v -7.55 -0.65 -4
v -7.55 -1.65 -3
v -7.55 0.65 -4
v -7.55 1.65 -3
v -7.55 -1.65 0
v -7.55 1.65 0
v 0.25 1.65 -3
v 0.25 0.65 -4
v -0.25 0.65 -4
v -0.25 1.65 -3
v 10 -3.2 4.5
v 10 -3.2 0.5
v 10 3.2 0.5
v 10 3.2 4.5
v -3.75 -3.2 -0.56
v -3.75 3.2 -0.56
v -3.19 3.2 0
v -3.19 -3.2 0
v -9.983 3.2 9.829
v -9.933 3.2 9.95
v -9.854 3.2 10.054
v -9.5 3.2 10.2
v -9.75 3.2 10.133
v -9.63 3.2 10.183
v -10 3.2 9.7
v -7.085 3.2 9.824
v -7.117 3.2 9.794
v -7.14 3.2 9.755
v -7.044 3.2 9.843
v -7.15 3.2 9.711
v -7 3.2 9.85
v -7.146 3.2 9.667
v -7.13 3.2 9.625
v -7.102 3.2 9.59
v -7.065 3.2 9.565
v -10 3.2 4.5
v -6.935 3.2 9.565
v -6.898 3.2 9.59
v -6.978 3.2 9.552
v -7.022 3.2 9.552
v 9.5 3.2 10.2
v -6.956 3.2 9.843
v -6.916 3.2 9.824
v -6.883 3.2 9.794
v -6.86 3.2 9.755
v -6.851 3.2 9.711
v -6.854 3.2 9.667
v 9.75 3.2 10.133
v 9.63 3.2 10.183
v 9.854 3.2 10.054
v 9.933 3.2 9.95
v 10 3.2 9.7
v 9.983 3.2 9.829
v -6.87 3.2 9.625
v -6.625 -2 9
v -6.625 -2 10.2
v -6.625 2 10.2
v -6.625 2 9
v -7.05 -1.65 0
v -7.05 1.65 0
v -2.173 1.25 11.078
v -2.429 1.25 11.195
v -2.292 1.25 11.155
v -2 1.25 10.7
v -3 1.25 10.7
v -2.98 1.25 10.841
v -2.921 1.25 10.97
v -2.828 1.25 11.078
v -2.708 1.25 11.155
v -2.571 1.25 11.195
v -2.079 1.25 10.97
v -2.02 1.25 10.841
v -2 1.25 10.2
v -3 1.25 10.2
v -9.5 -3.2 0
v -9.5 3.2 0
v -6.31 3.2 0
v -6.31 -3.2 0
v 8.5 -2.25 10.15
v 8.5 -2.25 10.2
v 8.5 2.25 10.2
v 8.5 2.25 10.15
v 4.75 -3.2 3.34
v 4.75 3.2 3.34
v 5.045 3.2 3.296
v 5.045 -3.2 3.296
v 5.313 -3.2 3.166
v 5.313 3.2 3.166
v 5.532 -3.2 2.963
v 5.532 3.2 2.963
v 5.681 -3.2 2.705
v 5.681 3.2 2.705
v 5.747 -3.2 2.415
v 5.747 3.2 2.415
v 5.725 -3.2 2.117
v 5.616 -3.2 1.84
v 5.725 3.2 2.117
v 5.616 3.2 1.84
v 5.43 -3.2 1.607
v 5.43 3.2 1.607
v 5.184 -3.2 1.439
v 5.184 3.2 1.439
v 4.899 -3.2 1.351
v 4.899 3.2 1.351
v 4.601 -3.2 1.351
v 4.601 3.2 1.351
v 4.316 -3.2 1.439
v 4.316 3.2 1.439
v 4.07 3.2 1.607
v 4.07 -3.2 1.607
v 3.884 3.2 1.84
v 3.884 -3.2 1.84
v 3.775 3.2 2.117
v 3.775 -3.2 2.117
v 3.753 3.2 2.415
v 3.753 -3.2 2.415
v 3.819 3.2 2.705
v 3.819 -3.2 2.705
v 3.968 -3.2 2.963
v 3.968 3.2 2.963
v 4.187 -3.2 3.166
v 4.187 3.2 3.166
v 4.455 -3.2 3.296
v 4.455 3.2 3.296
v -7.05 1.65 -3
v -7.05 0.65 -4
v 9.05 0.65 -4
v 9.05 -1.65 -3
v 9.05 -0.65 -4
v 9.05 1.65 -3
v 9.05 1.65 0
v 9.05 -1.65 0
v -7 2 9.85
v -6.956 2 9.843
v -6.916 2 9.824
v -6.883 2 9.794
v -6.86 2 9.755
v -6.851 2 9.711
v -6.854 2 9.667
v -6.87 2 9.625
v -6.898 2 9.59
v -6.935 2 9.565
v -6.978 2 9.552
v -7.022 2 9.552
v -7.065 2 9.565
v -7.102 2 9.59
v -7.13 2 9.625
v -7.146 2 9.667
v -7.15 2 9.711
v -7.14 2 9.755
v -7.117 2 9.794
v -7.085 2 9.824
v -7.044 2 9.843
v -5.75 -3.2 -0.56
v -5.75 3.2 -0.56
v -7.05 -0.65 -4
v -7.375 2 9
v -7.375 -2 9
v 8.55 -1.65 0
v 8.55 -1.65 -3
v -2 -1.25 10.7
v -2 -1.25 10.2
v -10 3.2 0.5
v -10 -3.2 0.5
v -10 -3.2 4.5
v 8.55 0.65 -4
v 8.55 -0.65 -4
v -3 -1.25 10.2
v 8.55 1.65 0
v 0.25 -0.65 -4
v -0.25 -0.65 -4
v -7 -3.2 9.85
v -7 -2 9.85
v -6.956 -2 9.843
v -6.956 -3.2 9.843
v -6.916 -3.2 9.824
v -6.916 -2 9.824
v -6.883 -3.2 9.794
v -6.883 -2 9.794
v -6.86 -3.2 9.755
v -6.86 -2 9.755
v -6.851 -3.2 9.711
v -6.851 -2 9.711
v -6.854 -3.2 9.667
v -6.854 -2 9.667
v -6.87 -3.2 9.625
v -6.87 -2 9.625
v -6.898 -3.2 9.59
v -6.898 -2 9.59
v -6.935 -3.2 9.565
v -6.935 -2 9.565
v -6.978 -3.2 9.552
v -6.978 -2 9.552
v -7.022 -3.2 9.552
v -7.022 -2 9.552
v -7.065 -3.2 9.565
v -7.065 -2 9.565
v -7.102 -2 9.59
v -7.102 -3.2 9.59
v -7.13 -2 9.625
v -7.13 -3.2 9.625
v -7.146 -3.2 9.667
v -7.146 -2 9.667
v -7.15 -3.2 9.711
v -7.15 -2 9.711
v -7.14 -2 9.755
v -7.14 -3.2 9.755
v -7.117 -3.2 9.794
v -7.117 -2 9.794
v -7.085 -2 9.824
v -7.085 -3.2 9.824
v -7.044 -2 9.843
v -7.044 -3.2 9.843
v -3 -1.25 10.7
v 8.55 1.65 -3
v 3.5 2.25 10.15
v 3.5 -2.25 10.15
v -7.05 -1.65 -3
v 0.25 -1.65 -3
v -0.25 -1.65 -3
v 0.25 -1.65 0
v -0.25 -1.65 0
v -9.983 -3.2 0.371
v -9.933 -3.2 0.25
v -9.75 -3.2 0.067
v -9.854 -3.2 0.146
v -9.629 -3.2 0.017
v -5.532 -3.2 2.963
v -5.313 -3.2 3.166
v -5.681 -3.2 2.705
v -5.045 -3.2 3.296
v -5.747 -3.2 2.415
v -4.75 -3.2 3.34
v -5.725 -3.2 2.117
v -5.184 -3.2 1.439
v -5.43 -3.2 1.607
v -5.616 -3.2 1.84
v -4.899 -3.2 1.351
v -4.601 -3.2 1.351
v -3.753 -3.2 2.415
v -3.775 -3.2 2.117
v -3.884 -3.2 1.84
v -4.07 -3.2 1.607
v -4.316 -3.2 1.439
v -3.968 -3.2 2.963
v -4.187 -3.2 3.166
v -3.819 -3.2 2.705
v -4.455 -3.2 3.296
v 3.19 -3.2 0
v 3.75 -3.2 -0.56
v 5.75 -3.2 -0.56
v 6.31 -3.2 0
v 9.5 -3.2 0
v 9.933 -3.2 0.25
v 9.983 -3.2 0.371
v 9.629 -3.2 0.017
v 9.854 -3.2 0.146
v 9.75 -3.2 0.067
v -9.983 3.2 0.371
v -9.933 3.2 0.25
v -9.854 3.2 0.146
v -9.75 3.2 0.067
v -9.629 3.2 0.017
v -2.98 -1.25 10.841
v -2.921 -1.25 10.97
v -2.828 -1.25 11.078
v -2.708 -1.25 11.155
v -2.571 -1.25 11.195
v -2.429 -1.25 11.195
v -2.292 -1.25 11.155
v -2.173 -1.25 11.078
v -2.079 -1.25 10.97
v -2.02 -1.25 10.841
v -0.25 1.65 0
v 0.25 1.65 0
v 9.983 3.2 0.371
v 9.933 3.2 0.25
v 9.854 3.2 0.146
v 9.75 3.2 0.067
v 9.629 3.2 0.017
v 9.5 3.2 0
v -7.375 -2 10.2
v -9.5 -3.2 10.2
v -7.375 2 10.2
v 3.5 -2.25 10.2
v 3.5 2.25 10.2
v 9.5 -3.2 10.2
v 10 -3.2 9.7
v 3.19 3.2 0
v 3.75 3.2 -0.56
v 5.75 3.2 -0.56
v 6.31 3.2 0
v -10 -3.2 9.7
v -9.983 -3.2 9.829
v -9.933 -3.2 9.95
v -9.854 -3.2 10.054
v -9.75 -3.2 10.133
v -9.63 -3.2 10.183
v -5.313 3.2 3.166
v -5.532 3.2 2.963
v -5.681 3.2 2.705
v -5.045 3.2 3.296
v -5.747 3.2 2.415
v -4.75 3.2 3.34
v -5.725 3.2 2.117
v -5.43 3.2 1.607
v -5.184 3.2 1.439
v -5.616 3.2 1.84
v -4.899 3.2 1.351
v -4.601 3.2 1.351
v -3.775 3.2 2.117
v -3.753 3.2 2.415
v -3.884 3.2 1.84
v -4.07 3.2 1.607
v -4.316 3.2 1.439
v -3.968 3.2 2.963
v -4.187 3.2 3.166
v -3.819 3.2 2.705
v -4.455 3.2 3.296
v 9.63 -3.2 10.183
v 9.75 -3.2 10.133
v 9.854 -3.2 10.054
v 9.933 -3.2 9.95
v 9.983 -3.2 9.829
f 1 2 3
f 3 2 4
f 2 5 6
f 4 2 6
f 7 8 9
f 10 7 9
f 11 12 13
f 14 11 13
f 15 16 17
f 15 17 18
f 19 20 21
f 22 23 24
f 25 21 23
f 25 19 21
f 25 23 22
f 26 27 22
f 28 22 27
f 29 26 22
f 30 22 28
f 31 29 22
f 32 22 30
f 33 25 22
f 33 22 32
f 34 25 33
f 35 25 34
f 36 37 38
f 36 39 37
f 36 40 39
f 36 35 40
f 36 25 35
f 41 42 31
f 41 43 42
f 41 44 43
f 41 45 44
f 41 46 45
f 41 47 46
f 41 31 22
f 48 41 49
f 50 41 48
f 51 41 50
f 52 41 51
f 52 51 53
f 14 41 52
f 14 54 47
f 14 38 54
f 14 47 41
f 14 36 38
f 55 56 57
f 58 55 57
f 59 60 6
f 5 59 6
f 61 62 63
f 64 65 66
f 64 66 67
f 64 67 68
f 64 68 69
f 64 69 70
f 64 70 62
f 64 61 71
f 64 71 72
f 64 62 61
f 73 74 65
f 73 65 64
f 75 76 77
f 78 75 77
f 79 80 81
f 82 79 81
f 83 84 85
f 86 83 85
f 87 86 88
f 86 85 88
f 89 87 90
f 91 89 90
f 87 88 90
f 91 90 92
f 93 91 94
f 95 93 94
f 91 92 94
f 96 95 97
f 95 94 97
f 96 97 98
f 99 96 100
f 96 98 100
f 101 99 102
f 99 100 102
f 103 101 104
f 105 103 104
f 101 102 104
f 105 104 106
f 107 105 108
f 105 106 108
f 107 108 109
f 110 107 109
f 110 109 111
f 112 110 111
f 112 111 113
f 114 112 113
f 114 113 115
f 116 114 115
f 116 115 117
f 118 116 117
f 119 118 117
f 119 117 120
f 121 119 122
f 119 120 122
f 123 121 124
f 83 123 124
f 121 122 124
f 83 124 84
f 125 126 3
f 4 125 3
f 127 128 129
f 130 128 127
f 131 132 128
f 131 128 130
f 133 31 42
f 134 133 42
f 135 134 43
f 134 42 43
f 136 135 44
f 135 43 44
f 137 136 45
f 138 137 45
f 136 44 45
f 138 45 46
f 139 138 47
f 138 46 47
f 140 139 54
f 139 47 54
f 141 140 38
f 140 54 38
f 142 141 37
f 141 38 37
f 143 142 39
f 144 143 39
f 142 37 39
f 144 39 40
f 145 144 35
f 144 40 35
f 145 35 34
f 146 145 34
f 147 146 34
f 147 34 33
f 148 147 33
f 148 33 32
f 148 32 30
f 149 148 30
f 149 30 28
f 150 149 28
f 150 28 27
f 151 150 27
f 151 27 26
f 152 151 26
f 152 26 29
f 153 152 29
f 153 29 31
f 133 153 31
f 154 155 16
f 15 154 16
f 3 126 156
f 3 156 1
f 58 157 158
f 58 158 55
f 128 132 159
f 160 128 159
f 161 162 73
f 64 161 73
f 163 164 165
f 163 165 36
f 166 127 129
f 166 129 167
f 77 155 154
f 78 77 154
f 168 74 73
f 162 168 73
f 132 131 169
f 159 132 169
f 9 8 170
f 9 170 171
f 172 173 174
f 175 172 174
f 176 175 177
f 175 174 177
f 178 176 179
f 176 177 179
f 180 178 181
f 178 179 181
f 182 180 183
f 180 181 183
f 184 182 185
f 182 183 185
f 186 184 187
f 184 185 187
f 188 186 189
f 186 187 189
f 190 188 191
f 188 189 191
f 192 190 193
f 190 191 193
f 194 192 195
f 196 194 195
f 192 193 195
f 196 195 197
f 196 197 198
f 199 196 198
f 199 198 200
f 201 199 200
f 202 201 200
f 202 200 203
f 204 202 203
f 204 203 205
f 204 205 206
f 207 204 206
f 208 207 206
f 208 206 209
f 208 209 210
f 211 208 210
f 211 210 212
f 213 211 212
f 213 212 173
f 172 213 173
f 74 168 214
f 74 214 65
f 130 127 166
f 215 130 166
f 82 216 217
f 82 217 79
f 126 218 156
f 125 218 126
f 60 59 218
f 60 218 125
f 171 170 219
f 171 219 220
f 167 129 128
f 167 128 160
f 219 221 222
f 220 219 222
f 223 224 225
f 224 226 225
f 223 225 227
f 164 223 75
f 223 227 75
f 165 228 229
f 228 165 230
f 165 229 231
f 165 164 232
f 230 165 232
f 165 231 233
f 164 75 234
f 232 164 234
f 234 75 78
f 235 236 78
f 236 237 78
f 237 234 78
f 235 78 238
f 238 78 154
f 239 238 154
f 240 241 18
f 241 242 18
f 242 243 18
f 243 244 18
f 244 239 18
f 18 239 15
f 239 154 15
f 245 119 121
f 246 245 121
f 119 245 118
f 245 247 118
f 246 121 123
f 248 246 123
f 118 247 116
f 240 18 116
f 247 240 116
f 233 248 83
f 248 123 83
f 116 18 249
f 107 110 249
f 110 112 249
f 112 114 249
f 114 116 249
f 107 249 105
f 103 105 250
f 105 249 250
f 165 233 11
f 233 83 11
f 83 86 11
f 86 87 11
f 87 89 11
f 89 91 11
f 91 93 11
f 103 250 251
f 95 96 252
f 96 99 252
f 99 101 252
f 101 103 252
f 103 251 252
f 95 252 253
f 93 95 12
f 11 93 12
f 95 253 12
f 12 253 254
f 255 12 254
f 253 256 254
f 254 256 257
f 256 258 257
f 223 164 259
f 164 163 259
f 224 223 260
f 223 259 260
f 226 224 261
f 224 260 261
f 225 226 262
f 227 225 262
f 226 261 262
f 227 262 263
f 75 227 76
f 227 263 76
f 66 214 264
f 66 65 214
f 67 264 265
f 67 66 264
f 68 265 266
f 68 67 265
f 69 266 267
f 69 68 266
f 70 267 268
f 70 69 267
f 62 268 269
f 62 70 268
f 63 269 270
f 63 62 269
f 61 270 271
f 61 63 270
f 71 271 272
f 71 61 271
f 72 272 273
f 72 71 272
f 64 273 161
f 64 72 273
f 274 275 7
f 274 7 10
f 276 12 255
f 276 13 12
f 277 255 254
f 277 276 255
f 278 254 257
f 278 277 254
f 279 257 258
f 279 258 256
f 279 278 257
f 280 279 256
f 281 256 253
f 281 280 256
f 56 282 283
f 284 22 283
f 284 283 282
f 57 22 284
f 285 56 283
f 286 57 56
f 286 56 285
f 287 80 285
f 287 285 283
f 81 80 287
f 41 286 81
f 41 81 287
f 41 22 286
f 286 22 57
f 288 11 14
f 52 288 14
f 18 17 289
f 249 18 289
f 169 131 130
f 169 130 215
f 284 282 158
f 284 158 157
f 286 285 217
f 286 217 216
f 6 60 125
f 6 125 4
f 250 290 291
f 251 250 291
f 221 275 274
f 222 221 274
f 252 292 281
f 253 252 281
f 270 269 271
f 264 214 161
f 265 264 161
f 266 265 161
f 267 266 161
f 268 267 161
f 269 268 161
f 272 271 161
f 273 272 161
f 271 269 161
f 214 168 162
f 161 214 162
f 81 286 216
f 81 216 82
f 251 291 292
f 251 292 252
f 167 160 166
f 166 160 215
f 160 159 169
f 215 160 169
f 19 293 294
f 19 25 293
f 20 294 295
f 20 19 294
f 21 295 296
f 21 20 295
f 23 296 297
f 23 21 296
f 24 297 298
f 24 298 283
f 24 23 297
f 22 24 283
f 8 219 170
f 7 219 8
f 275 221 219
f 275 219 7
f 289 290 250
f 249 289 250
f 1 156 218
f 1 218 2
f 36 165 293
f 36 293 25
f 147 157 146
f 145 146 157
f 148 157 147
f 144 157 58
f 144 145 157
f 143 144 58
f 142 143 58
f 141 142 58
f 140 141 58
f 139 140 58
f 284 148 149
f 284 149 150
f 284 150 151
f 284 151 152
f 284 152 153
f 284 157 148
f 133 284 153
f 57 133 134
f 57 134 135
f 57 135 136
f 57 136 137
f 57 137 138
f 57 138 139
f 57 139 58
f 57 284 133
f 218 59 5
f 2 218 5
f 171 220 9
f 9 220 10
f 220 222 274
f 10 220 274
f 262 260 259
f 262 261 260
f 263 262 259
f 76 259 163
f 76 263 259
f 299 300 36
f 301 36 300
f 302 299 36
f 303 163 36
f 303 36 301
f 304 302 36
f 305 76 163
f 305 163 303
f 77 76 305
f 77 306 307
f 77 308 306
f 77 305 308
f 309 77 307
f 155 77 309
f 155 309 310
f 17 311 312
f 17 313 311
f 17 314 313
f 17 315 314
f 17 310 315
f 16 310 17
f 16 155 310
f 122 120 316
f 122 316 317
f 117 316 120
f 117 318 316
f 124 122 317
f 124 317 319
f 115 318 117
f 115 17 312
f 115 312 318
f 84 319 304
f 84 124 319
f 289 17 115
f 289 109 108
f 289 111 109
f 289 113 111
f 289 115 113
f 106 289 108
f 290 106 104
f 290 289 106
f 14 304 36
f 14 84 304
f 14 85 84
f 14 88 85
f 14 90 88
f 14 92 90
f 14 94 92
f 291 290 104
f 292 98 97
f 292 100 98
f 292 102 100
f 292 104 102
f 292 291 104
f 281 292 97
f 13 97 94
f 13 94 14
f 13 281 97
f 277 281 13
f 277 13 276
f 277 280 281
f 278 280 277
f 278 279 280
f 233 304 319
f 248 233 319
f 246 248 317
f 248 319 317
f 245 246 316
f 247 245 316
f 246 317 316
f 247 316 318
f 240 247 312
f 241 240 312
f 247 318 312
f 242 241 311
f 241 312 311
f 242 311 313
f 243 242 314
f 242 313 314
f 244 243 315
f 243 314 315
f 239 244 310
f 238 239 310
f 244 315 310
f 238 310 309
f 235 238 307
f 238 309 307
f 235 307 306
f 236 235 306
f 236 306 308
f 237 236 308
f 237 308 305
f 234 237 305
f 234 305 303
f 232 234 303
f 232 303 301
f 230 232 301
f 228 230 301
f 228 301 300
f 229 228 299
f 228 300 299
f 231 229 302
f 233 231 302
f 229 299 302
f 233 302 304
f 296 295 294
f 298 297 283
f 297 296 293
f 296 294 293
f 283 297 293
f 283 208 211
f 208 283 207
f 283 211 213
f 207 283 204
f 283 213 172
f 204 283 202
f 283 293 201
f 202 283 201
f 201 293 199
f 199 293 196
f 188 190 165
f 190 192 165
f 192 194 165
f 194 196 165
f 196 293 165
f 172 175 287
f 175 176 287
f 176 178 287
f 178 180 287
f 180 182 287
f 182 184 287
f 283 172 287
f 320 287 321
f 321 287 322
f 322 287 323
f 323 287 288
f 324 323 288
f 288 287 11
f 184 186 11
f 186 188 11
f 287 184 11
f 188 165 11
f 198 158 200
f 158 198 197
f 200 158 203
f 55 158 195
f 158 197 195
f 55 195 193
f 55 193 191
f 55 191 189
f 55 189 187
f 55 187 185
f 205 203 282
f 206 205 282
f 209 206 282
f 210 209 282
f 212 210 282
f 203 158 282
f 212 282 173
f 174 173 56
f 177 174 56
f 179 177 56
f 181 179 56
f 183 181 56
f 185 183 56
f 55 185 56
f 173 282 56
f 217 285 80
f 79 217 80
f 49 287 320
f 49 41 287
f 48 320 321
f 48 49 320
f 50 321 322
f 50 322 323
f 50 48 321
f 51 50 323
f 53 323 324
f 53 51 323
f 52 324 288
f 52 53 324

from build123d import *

# Parameters (mm, degrees)
BASE_SKETCH_W               = 20
BASE_SKETCH_H               = 6.4
BASE_EXTRUDE_DEPTH          = 4.5
CONTACTS_SKETCH_W           = 0.5
CONTACTS_SKETCH_H           = 3.3
CONTACTS_EXTRUDE_DEPTH      = 4
CONTACTS_EXTRUDE_2_DEPTH    = 4
CONTACTS_EXTRUDE_3_DEPTH    = 4
CONTACT_1_CHAMFER_SIZE      = 1
CHAMFER1_SIZE               = 1
CHAMFER2_SIZE               = 1
MOUNTING_HOLES_SKETCH_R     = 1
CUT_MOUNTING_HOLES_DEPTH    = 6.4
BOTTOM_PROTRUSIONS_SKETCH_W = 2
BOTTOM_PROTRUSIONS_SKETCH_H = 0.56
BOTTOM_PROTRUSIONS_DEPTH    = 6.4
CHAMFER_PROTRUSIONS_SIZE    = 0.56
TOP_SKETCH_W                = 20.0002
TOP_SKETCH_H                = 6.4002
TOP_EXTRUDE_DEPTH           = 5.7
BUTTON_SKETCH_W             = 1
BUTTON_SKETCH_H             = 2.5
BUTTON_EXTRUDE_DEPTH        = 1
BUTTON_FILLET_RADIUS        = 0.5
BUTTON_FILLET_LENGTH        = 2.5
TOP_INDENT_SKETCH_W         = 5
TOP_INDENT_SKETCH_H         = 4.5
TOP_INDENT_CUT_DEPTH        = 0.05
PIVOT_HOLE_SKETCH_R         = 0.15
LEVER_PIVOT_HOLE_CUT_DEPTH  = 10
LEVER_RECESS_SKETCH_W       = 0.75
LEVER_RECESS_SKETCH_H       = 4
LEVER_RECESS_CUT_DEPTH      = 1.2
CORNER_FILLET_R             = 0.5


with BuildPart() as part:
    # Base Sketch → Base Extrude (new body)
    with BuildSketch(Plane.XY):
        Rectangle(BASE_SKETCH_W, BASE_SKETCH_H)
    extrude(amount=BASE_EXTRUDE_DEPTH)

    # Mounting Holes Sketch → Cut Mounting Holes (cut)
    with BuildSketch(Plane(origin=(0, 3.2, 0), x_dir=(1, 0, 0), z_dir=(0, 1, 0))):
        with Locations(Location((-4.75, -2.34, 0), (0, 0, 270))):
            Circle(MOUNTING_HOLES_SKETCH_R)
        with Locations(Location((4.75, -2.34, 0), (0, 0, 270))):
            Circle(MOUNTING_HOLES_SKETCH_R)
    extrude(amount=-CUT_MOUNTING_HOLES_DEPTH, mode=Mode.SUBTRACT)

    # Bottom Protrusions Sketch → Bottom Protrusions (add)
    with BuildSketch(Plane(origin=(0, 3.2, 0), x_dir=(1, 0, 0), z_dir=(0, 1, 0))):
        with Locations((-4.75, 0.28)):
            Rectangle(BOTTOM_PROTRUSIONS_SKETCH_W, BOTTOM_PROTRUSIONS_SKETCH_H)
        with Locations((4.75, 0.28)):
            Rectangle(BOTTOM_PROTRUSIONS_SKETCH_W, BOTTOM_PROTRUSIONS_SKETCH_H)
    extrude(amount=-BOTTOM_PROTRUSIONS_DEPTH)

    # Chamfer Protrusions
    chamfer_protrusions_edges = [part.edges().sort_by_distance(p)[0] for p in [
        (5.75, 0, 0),
        (3.75, 0, 0),
        (-3.75, 0, 0),
        (-5.75, 0, 0),
    ]]
    chamfer(chamfer_protrusions_edges, length=CHAMFER_PROTRUSIONS_SIZE - 0.0001)  # a hair under: the kernel refuses the full size

    # Top Sketch → Top Extrude (add)
    with BuildSketch(Plane.XY.offset(4.5)):
        Rectangle(TOP_SKETCH_W, TOP_SKETCH_H)
    extrude(amount=TOP_EXTRUDE_DEPTH)

    # Top Indent Sketch → Top Indent Cut (cut)
    with BuildSketch(Plane.XY.offset(10.2)):
        with Locations((6.0001, 0)):
            Rectangle(TOP_INDENT_SKETCH_W, TOP_INDENT_SKETCH_H)
    extrude(amount=-TOP_INDENT_CUT_DEPTH, mode=Mode.SUBTRACT)

    # Pivot Hole Sketch → Lever Pivot Hole Cut (cut)
    with BuildSketch(Plane(origin=(0, 3.2001, 0), x_dir=(1, 0, 0), z_dir=(0, 1, 0))):
        with Locations(Location((-7.000095614, -9.7, 0), (0, 0, 270))):
            Circle(PIVOT_HOLE_SKETCH_R)
    extrude(amount=-LEVER_PIVOT_HOLE_CUT_DEPTH, mode=Mode.SUBTRACT)

    # Lever Recess Sketch → Lever Recess Cut (cut)
    with BuildSketch(Plane.XY.offset(10.2)):
        with Locations((-7.0001, 0)):
            Rectangle(LEVER_RECESS_SKETCH_W, LEVER_RECESS_SKETCH_H)
    extrude(amount=-LEVER_RECESS_CUT_DEPTH, mode=Mode.SUBTRACT)

    # Corner Fillet
    corner_fillet_edges = [part.edges().sort_by_distance(p)[0] for p in [
        (10.0001, 0, 10.2),
        (-10.0001, 0, 10.2),
        (-10, 0, 0),
        (10, 0, 0),
    ]]
    fillet(corner_fillet_edges, radius=CORNER_FILLET_R)


with BuildPart() as body_2:
    # Contacts Sketch → Contacts Extrude (new body)
    with BuildSketch(Plane(origin=(0, 0, 0), x_dir=(-1, 0, 0), z_dir=(0, 0, -1))):
        Rectangle(CONTACTS_SKETCH_W, CONTACTS_SKETCH_H)
    extrude(amount=CONTACTS_EXTRUDE_DEPTH)

    # Chamfer1
    chamfer1_edges = [body_2.edges().sort_by_distance(p)[0] for p in [
        (0, -1.65, -4),
        (0, 1.65, -4),
    ]]
    chamfer(chamfer1_edges, length=CHAMFER1_SIZE)


with BuildPart() as body_3:
    # Contacts Sketch → Contacts Extrude 2 (new body)
    with BuildSketch(Plane(origin=(0, 0, 0), x_dir=(-1, 0, 0), z_dir=(0, 0, -1))):
        with Locations((-8.8, 0)):
            Rectangle(CONTACTS_SKETCH_W, CONTACTS_SKETCH_H)
    extrude(amount=CONTACTS_EXTRUDE_2_DEPTH)

    # Chamfer2
    chamfer2_edges = [body_3.edges().sort_by_distance(p)[0] for p in [
        (8.8, -1.65, -4),
        (8.8, 1.65, -4),
    ]]
    chamfer(chamfer2_edges, length=CHAMFER2_SIZE)


with BuildPart() as body_4:
    # Contacts Sketch → Contacts Extrude 3 (new body)
    with BuildSketch(Plane(origin=(0, 0, 0), x_dir=(-1, 0, 0), z_dir=(0, 0, -1))):
        with Locations((7.3, 0)):
            Rectangle(CONTACTS_SKETCH_W, CONTACTS_SKETCH_H)
    extrude(amount=CONTACTS_EXTRUDE_3_DEPTH)

    # Contact 1 Chamfer
    contact_1_chamfer_edges = [body_4.edges().sort_by_distance(p)[0] for p in [
        (-7.3, -1.65, -4),
        (-7.3, 1.65, -4),
    ]]
    chamfer(contact_1_chamfer_edges, length=CONTACT_1_CHAMFER_SIZE)


with BuildPart() as body_5:
    # Button Sketch → Button Extrude (new body)
    with BuildSketch(Plane.XY.offset(10.2)):
        with Locations((-2.5001, 0)):
            Rectangle(BUTTON_SKETCH_W, BUTTON_SKETCH_H)
    extrude(amount=BUTTON_EXTRUDE_DEPTH)

    # Button Fillet: full round fillet: the end face becomes a half cylinder, R = half its width
    button_fillet_face = Plane((-2.5001, 0, 11.2), x_dir=(0, 1, 0), z_dir=(0, 0, 1))  # on the end face: x along it, z out of the body
    button_fillet_slab = button_fillet_face.offset(-BUTTON_FILLET_RADIUS / 2) * Box(BUTTON_FILLET_LENGTH, 2 * BUTTON_FILLET_RADIUS, BUTTON_FILLET_RADIUS, mode=Mode.PRIVATE)  # the body's end, R deep
    button_fillet_round = Plane((-2.5001, 0, 10.7), x_dir=(0, 0, 1), z_dir=(0, 1, 0)) * Cylinder(BUTTON_FILLET_RADIUS, BUTTON_FILLET_LENGTH, mode=Mode.PRIVATE)  # its axis R under the face
    add(button_fillet_slab - button_fillet_round, mode=Mode.SUBTRACT)


solid = Compound([part.part, body_2.part, body_3.part, body_4.part, body_5.part])
